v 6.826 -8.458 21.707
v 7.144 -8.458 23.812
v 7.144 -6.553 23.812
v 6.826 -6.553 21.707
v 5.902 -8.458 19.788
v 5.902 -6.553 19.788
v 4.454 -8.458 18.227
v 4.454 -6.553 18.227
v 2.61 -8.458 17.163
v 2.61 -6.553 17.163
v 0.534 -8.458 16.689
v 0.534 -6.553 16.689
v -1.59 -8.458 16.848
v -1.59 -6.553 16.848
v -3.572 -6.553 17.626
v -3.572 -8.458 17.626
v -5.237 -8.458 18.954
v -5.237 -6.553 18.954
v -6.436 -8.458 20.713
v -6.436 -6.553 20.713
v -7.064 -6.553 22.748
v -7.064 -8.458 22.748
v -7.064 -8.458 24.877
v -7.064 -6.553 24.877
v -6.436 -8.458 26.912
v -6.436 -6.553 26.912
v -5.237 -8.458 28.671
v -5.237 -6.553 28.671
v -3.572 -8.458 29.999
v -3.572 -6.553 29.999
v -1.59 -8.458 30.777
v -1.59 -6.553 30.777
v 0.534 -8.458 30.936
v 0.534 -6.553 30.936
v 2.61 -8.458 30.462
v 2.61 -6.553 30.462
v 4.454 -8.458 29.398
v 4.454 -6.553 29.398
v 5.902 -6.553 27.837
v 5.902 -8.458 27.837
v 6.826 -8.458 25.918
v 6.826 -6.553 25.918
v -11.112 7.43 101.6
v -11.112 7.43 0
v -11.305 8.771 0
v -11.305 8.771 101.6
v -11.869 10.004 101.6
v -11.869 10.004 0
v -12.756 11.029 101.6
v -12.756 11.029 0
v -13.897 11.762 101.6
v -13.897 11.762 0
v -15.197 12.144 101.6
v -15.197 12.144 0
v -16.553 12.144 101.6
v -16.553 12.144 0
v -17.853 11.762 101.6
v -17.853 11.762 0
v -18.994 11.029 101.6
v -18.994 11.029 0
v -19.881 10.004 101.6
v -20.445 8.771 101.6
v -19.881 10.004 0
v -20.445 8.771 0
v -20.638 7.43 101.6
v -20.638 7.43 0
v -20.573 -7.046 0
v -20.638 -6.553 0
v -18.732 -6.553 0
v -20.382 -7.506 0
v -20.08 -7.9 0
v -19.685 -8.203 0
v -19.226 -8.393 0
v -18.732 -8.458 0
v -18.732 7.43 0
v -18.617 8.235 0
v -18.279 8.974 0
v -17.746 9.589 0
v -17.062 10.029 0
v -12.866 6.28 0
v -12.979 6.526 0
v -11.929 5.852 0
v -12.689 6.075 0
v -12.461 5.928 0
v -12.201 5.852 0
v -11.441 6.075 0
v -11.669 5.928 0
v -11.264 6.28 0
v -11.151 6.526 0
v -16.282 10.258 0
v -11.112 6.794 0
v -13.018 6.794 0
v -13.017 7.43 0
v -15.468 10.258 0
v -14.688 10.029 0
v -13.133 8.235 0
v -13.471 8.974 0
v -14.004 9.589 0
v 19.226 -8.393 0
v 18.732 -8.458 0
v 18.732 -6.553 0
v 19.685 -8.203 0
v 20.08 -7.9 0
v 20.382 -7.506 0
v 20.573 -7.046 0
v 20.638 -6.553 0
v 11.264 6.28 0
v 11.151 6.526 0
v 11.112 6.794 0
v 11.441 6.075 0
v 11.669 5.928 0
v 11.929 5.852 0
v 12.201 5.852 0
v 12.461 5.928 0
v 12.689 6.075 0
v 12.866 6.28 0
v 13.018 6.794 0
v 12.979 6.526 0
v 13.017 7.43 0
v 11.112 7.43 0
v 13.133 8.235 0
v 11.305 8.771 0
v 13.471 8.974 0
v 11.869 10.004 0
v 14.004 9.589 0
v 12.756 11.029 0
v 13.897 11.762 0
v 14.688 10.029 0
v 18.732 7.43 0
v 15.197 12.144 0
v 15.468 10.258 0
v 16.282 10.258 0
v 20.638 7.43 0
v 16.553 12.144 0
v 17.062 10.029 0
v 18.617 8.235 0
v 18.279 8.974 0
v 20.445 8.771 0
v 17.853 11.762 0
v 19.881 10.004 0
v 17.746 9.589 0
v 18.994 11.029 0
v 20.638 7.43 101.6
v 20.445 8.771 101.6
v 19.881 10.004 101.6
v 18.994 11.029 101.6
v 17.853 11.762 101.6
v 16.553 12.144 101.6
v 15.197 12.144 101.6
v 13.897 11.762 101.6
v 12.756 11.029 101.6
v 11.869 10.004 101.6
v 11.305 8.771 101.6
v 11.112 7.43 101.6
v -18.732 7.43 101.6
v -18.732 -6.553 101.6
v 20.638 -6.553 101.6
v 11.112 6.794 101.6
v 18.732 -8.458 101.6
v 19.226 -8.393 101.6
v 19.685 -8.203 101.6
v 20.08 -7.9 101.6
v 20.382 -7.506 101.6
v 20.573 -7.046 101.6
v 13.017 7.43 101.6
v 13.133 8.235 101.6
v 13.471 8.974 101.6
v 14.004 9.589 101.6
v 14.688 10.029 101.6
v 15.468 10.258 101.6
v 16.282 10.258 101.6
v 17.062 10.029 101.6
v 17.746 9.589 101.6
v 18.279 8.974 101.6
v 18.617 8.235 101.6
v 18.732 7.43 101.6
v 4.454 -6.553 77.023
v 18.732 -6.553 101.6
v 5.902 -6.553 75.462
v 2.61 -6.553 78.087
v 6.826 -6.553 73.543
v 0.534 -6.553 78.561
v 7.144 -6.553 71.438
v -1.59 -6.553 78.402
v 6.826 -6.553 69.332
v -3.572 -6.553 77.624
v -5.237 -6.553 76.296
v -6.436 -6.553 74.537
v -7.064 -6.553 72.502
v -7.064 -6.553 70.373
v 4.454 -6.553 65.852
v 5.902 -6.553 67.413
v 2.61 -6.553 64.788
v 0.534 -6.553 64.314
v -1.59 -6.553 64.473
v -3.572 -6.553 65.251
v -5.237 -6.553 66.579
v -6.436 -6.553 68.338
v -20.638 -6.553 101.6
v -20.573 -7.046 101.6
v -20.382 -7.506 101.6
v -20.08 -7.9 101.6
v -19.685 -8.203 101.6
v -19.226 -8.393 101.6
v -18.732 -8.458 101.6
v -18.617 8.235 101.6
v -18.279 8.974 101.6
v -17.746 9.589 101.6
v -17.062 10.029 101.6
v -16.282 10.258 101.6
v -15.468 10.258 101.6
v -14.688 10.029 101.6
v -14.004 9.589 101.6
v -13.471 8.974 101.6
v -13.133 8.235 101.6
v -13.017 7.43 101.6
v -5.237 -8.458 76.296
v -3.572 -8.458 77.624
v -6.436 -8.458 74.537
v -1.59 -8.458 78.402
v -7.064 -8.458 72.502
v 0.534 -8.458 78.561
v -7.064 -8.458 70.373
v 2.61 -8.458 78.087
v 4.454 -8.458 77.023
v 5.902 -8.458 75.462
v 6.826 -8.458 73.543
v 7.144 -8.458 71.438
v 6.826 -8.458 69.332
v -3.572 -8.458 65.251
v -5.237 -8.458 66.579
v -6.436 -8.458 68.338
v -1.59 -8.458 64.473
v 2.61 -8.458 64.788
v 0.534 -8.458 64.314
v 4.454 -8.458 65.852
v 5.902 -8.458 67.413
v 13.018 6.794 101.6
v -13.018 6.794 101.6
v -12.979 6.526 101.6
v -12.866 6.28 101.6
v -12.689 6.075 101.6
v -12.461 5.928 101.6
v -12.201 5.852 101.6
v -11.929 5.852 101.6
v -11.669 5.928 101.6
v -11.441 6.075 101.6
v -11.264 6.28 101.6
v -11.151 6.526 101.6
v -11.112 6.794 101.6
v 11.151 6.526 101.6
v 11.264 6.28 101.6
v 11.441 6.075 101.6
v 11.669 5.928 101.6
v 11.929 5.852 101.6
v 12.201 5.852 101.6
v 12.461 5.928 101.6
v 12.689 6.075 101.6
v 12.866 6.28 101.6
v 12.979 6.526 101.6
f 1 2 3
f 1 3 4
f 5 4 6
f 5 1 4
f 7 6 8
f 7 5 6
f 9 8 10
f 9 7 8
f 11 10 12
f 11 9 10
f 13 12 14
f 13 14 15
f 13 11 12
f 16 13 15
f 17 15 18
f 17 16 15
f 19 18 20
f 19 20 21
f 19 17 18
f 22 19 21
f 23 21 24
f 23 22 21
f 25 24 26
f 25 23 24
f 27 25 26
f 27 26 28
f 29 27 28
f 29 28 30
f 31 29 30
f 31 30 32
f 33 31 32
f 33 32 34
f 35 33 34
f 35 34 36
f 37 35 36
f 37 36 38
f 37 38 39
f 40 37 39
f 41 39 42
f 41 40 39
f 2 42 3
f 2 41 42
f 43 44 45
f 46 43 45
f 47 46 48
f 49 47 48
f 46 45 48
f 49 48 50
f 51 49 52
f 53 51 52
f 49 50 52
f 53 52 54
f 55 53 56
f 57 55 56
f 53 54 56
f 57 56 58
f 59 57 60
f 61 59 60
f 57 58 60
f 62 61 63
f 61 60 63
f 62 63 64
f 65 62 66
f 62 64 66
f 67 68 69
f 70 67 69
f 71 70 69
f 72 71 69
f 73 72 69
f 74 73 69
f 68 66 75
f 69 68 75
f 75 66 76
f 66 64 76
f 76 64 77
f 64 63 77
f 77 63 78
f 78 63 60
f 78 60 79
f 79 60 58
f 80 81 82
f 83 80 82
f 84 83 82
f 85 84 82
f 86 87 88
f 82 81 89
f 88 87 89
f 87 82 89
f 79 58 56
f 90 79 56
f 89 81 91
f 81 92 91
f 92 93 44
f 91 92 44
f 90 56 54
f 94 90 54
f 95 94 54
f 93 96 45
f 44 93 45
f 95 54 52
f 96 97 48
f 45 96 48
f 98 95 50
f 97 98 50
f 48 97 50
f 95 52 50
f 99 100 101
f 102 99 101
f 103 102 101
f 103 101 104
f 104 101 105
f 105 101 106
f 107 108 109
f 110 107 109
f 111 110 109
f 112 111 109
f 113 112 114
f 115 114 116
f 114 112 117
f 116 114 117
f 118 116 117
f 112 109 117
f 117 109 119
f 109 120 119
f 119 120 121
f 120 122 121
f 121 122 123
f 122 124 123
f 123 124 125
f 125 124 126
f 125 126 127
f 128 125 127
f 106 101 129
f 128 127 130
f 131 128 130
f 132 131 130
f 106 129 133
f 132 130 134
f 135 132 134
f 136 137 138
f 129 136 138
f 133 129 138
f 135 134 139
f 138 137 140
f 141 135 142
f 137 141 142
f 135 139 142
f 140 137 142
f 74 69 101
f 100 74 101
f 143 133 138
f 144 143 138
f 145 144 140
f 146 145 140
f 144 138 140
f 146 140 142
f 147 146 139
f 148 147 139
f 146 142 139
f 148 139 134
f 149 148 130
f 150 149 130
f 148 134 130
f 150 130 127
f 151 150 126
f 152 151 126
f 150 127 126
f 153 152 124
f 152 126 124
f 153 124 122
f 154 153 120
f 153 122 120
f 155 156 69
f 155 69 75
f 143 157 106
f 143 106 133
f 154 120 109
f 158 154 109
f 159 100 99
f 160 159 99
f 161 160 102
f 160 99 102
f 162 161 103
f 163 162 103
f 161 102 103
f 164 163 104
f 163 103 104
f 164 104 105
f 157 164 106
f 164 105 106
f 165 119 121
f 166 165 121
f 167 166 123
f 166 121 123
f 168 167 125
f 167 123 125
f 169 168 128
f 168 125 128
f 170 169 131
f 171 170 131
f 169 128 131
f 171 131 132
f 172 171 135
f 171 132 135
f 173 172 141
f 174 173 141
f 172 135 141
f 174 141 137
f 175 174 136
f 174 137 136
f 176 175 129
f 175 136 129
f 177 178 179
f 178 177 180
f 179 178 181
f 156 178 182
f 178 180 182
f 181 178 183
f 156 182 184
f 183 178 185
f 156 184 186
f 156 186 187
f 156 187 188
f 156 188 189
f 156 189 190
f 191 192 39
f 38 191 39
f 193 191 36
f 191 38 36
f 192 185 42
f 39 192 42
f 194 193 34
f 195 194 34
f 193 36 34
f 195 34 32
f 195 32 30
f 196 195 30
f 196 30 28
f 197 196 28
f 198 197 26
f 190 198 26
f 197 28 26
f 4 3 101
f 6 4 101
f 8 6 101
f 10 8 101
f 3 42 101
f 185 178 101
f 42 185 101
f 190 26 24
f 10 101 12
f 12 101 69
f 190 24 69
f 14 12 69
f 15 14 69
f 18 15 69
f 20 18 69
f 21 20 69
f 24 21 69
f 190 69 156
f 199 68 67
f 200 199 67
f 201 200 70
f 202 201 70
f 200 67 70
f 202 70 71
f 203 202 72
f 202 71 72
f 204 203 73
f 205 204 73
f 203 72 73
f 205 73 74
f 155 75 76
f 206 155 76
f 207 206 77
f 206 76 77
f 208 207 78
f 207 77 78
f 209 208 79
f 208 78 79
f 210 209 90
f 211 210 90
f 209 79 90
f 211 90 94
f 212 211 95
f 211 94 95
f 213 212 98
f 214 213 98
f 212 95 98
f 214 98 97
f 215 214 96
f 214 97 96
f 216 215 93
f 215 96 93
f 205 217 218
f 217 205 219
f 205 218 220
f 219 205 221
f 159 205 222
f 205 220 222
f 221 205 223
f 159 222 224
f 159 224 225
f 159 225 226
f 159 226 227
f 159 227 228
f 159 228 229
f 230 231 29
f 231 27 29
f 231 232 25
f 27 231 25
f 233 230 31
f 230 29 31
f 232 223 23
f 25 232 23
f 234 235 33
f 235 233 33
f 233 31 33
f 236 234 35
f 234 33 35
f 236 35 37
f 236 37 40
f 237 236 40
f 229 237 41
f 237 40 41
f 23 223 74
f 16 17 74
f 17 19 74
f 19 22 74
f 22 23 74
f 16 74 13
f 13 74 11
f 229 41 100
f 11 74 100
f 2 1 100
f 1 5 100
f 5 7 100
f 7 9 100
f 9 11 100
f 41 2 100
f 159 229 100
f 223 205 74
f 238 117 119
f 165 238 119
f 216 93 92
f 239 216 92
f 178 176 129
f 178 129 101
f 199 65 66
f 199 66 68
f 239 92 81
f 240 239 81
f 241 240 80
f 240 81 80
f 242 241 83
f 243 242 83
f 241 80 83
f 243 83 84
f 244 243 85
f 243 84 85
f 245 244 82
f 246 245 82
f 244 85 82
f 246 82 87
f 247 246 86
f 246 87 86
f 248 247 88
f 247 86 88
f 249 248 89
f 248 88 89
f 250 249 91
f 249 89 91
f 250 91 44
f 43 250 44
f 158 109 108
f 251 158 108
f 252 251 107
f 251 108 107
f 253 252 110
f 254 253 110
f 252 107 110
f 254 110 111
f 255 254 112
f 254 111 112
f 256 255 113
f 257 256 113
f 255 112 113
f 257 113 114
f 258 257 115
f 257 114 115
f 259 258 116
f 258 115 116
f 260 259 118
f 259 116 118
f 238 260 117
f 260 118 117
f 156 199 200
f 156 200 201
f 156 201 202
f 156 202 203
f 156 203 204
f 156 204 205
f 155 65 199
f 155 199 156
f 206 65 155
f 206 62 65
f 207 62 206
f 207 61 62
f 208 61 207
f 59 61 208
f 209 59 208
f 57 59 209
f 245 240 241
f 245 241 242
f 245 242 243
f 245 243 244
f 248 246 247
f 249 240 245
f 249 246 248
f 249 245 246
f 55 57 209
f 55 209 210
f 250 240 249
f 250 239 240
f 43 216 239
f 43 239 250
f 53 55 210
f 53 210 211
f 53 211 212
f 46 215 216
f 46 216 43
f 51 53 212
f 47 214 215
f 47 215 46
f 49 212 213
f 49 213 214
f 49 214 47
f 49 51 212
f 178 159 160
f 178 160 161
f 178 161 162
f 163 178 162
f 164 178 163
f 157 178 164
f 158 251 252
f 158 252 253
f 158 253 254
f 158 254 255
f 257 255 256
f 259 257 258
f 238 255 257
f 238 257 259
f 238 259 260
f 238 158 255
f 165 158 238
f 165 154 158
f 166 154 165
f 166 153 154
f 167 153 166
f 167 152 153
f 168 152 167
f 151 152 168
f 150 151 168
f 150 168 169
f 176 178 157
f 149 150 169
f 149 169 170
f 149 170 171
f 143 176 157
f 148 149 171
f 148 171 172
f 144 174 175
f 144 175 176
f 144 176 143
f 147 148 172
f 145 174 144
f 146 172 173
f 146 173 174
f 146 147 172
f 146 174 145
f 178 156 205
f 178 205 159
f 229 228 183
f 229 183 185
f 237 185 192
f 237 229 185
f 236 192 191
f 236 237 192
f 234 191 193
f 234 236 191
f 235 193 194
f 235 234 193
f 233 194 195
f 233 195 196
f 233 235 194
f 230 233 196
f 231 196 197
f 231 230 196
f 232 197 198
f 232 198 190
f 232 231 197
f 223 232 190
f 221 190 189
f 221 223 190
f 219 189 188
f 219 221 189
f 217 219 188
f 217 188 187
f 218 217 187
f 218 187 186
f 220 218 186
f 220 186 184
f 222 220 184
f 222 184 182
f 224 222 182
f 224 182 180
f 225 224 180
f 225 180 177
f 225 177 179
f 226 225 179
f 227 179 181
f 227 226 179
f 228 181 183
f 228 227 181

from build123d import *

# Parameters (mm, degrees)
BASE_EXTRUDE_DEPTH = 101.6
HOLE1_START        = -8.4582
HOLE1_OUTLINE_R    = 7.14375
HOLE1_DEPTH        = 1.905
LPATTERN2_COUNT    = 2
LPATTERN2_PITCH    = 47.625


with BuildPart() as part:
    # Sketch1 → Base-Extrude (new body)
    with BuildSketch(Plane.XY):
        with BuildLine():
            Line((-20.6375, 7.4295), (-20.6375, -6.5532))
            ThreePointArc((-20.6375, -6.5532), (-20.079538418, -7.900238418), (-18.7325, -8.4582))
            Line((-18.7325, -8.4582), (18.7325, -8.4582))
            ThreePointArc((18.7325, -8.4582), (20.079538418, -7.900238418), (20.6375, -6.5532))
            Line((20.6375, -6.5532), (20.6375, 7.4295))
            ThreePointArc((20.6375, 7.4295), (15.875, 12.192), (11.1125, 7.4295))
            Line((11.1125, 7.4295), (11.1125, 6.7945))
            ThreePointArc((11.1125, 6.7945), (12.065, 5.842), (13.0175, 6.7945))
            Line((13.0175, 6.7945), (13.0175, 7.4295))
            ThreePointArc((13.0175, 7.4295), (15.875, 10.287), (18.7325, 7.4295))
            Line((18.7325, 7.4295), (18.7325, -6.5532))
            Line((18.7325, -6.5532), (-18.7325, -6.5532))
            Line((-18.7325, -6.5532), (-18.7325, 7.4295))
            ThreePointArc((-18.7325, 7.4295), (-15.875, 10.287), (-13.0175, 7.4295))
            Line((-13.0175, 7.4295), (-13.0175, 6.7945))
            ThreePointArc((-13.0175, 6.7945), (-12.065, 5.842), (-11.1125, 6.7945))
            Line((-11.1125, 6.7945), (-11.1125, 7.4295))
            ThreePointArc((-11.1125, 7.4295), (-15.875, 12.192), (-20.6375, 7.4295))
        make_face()
    extrude(amount=BASE_EXTRUDE_DEPTH)

    # Hole1: read off the stored shape, not the designer's step
    # Hole1 outline → Hole1 (cut)
    with BuildSketch(Plane(origin=(0, 0, 0), x_dir=(1, 0, 0), z_dir=(0, 1, 0)).offset(HOLE1_START)):
        with Locations((0, -23.8125)):
            Circle(HOLE1_OUTLINE_R)
    hole1 = extrude(amount=HOLE1_DEPTH, mode=Mode.SUBTRACT)

    # LPattern2: Hole1 ×2
    with Locations(*[(0, 0, i * LPATTERN2_PITCH) for i in range(1, LPATTERN2_COUNT)]):
        add(hole1, mode=Mode.SUBTRACT)


solid = part.part
